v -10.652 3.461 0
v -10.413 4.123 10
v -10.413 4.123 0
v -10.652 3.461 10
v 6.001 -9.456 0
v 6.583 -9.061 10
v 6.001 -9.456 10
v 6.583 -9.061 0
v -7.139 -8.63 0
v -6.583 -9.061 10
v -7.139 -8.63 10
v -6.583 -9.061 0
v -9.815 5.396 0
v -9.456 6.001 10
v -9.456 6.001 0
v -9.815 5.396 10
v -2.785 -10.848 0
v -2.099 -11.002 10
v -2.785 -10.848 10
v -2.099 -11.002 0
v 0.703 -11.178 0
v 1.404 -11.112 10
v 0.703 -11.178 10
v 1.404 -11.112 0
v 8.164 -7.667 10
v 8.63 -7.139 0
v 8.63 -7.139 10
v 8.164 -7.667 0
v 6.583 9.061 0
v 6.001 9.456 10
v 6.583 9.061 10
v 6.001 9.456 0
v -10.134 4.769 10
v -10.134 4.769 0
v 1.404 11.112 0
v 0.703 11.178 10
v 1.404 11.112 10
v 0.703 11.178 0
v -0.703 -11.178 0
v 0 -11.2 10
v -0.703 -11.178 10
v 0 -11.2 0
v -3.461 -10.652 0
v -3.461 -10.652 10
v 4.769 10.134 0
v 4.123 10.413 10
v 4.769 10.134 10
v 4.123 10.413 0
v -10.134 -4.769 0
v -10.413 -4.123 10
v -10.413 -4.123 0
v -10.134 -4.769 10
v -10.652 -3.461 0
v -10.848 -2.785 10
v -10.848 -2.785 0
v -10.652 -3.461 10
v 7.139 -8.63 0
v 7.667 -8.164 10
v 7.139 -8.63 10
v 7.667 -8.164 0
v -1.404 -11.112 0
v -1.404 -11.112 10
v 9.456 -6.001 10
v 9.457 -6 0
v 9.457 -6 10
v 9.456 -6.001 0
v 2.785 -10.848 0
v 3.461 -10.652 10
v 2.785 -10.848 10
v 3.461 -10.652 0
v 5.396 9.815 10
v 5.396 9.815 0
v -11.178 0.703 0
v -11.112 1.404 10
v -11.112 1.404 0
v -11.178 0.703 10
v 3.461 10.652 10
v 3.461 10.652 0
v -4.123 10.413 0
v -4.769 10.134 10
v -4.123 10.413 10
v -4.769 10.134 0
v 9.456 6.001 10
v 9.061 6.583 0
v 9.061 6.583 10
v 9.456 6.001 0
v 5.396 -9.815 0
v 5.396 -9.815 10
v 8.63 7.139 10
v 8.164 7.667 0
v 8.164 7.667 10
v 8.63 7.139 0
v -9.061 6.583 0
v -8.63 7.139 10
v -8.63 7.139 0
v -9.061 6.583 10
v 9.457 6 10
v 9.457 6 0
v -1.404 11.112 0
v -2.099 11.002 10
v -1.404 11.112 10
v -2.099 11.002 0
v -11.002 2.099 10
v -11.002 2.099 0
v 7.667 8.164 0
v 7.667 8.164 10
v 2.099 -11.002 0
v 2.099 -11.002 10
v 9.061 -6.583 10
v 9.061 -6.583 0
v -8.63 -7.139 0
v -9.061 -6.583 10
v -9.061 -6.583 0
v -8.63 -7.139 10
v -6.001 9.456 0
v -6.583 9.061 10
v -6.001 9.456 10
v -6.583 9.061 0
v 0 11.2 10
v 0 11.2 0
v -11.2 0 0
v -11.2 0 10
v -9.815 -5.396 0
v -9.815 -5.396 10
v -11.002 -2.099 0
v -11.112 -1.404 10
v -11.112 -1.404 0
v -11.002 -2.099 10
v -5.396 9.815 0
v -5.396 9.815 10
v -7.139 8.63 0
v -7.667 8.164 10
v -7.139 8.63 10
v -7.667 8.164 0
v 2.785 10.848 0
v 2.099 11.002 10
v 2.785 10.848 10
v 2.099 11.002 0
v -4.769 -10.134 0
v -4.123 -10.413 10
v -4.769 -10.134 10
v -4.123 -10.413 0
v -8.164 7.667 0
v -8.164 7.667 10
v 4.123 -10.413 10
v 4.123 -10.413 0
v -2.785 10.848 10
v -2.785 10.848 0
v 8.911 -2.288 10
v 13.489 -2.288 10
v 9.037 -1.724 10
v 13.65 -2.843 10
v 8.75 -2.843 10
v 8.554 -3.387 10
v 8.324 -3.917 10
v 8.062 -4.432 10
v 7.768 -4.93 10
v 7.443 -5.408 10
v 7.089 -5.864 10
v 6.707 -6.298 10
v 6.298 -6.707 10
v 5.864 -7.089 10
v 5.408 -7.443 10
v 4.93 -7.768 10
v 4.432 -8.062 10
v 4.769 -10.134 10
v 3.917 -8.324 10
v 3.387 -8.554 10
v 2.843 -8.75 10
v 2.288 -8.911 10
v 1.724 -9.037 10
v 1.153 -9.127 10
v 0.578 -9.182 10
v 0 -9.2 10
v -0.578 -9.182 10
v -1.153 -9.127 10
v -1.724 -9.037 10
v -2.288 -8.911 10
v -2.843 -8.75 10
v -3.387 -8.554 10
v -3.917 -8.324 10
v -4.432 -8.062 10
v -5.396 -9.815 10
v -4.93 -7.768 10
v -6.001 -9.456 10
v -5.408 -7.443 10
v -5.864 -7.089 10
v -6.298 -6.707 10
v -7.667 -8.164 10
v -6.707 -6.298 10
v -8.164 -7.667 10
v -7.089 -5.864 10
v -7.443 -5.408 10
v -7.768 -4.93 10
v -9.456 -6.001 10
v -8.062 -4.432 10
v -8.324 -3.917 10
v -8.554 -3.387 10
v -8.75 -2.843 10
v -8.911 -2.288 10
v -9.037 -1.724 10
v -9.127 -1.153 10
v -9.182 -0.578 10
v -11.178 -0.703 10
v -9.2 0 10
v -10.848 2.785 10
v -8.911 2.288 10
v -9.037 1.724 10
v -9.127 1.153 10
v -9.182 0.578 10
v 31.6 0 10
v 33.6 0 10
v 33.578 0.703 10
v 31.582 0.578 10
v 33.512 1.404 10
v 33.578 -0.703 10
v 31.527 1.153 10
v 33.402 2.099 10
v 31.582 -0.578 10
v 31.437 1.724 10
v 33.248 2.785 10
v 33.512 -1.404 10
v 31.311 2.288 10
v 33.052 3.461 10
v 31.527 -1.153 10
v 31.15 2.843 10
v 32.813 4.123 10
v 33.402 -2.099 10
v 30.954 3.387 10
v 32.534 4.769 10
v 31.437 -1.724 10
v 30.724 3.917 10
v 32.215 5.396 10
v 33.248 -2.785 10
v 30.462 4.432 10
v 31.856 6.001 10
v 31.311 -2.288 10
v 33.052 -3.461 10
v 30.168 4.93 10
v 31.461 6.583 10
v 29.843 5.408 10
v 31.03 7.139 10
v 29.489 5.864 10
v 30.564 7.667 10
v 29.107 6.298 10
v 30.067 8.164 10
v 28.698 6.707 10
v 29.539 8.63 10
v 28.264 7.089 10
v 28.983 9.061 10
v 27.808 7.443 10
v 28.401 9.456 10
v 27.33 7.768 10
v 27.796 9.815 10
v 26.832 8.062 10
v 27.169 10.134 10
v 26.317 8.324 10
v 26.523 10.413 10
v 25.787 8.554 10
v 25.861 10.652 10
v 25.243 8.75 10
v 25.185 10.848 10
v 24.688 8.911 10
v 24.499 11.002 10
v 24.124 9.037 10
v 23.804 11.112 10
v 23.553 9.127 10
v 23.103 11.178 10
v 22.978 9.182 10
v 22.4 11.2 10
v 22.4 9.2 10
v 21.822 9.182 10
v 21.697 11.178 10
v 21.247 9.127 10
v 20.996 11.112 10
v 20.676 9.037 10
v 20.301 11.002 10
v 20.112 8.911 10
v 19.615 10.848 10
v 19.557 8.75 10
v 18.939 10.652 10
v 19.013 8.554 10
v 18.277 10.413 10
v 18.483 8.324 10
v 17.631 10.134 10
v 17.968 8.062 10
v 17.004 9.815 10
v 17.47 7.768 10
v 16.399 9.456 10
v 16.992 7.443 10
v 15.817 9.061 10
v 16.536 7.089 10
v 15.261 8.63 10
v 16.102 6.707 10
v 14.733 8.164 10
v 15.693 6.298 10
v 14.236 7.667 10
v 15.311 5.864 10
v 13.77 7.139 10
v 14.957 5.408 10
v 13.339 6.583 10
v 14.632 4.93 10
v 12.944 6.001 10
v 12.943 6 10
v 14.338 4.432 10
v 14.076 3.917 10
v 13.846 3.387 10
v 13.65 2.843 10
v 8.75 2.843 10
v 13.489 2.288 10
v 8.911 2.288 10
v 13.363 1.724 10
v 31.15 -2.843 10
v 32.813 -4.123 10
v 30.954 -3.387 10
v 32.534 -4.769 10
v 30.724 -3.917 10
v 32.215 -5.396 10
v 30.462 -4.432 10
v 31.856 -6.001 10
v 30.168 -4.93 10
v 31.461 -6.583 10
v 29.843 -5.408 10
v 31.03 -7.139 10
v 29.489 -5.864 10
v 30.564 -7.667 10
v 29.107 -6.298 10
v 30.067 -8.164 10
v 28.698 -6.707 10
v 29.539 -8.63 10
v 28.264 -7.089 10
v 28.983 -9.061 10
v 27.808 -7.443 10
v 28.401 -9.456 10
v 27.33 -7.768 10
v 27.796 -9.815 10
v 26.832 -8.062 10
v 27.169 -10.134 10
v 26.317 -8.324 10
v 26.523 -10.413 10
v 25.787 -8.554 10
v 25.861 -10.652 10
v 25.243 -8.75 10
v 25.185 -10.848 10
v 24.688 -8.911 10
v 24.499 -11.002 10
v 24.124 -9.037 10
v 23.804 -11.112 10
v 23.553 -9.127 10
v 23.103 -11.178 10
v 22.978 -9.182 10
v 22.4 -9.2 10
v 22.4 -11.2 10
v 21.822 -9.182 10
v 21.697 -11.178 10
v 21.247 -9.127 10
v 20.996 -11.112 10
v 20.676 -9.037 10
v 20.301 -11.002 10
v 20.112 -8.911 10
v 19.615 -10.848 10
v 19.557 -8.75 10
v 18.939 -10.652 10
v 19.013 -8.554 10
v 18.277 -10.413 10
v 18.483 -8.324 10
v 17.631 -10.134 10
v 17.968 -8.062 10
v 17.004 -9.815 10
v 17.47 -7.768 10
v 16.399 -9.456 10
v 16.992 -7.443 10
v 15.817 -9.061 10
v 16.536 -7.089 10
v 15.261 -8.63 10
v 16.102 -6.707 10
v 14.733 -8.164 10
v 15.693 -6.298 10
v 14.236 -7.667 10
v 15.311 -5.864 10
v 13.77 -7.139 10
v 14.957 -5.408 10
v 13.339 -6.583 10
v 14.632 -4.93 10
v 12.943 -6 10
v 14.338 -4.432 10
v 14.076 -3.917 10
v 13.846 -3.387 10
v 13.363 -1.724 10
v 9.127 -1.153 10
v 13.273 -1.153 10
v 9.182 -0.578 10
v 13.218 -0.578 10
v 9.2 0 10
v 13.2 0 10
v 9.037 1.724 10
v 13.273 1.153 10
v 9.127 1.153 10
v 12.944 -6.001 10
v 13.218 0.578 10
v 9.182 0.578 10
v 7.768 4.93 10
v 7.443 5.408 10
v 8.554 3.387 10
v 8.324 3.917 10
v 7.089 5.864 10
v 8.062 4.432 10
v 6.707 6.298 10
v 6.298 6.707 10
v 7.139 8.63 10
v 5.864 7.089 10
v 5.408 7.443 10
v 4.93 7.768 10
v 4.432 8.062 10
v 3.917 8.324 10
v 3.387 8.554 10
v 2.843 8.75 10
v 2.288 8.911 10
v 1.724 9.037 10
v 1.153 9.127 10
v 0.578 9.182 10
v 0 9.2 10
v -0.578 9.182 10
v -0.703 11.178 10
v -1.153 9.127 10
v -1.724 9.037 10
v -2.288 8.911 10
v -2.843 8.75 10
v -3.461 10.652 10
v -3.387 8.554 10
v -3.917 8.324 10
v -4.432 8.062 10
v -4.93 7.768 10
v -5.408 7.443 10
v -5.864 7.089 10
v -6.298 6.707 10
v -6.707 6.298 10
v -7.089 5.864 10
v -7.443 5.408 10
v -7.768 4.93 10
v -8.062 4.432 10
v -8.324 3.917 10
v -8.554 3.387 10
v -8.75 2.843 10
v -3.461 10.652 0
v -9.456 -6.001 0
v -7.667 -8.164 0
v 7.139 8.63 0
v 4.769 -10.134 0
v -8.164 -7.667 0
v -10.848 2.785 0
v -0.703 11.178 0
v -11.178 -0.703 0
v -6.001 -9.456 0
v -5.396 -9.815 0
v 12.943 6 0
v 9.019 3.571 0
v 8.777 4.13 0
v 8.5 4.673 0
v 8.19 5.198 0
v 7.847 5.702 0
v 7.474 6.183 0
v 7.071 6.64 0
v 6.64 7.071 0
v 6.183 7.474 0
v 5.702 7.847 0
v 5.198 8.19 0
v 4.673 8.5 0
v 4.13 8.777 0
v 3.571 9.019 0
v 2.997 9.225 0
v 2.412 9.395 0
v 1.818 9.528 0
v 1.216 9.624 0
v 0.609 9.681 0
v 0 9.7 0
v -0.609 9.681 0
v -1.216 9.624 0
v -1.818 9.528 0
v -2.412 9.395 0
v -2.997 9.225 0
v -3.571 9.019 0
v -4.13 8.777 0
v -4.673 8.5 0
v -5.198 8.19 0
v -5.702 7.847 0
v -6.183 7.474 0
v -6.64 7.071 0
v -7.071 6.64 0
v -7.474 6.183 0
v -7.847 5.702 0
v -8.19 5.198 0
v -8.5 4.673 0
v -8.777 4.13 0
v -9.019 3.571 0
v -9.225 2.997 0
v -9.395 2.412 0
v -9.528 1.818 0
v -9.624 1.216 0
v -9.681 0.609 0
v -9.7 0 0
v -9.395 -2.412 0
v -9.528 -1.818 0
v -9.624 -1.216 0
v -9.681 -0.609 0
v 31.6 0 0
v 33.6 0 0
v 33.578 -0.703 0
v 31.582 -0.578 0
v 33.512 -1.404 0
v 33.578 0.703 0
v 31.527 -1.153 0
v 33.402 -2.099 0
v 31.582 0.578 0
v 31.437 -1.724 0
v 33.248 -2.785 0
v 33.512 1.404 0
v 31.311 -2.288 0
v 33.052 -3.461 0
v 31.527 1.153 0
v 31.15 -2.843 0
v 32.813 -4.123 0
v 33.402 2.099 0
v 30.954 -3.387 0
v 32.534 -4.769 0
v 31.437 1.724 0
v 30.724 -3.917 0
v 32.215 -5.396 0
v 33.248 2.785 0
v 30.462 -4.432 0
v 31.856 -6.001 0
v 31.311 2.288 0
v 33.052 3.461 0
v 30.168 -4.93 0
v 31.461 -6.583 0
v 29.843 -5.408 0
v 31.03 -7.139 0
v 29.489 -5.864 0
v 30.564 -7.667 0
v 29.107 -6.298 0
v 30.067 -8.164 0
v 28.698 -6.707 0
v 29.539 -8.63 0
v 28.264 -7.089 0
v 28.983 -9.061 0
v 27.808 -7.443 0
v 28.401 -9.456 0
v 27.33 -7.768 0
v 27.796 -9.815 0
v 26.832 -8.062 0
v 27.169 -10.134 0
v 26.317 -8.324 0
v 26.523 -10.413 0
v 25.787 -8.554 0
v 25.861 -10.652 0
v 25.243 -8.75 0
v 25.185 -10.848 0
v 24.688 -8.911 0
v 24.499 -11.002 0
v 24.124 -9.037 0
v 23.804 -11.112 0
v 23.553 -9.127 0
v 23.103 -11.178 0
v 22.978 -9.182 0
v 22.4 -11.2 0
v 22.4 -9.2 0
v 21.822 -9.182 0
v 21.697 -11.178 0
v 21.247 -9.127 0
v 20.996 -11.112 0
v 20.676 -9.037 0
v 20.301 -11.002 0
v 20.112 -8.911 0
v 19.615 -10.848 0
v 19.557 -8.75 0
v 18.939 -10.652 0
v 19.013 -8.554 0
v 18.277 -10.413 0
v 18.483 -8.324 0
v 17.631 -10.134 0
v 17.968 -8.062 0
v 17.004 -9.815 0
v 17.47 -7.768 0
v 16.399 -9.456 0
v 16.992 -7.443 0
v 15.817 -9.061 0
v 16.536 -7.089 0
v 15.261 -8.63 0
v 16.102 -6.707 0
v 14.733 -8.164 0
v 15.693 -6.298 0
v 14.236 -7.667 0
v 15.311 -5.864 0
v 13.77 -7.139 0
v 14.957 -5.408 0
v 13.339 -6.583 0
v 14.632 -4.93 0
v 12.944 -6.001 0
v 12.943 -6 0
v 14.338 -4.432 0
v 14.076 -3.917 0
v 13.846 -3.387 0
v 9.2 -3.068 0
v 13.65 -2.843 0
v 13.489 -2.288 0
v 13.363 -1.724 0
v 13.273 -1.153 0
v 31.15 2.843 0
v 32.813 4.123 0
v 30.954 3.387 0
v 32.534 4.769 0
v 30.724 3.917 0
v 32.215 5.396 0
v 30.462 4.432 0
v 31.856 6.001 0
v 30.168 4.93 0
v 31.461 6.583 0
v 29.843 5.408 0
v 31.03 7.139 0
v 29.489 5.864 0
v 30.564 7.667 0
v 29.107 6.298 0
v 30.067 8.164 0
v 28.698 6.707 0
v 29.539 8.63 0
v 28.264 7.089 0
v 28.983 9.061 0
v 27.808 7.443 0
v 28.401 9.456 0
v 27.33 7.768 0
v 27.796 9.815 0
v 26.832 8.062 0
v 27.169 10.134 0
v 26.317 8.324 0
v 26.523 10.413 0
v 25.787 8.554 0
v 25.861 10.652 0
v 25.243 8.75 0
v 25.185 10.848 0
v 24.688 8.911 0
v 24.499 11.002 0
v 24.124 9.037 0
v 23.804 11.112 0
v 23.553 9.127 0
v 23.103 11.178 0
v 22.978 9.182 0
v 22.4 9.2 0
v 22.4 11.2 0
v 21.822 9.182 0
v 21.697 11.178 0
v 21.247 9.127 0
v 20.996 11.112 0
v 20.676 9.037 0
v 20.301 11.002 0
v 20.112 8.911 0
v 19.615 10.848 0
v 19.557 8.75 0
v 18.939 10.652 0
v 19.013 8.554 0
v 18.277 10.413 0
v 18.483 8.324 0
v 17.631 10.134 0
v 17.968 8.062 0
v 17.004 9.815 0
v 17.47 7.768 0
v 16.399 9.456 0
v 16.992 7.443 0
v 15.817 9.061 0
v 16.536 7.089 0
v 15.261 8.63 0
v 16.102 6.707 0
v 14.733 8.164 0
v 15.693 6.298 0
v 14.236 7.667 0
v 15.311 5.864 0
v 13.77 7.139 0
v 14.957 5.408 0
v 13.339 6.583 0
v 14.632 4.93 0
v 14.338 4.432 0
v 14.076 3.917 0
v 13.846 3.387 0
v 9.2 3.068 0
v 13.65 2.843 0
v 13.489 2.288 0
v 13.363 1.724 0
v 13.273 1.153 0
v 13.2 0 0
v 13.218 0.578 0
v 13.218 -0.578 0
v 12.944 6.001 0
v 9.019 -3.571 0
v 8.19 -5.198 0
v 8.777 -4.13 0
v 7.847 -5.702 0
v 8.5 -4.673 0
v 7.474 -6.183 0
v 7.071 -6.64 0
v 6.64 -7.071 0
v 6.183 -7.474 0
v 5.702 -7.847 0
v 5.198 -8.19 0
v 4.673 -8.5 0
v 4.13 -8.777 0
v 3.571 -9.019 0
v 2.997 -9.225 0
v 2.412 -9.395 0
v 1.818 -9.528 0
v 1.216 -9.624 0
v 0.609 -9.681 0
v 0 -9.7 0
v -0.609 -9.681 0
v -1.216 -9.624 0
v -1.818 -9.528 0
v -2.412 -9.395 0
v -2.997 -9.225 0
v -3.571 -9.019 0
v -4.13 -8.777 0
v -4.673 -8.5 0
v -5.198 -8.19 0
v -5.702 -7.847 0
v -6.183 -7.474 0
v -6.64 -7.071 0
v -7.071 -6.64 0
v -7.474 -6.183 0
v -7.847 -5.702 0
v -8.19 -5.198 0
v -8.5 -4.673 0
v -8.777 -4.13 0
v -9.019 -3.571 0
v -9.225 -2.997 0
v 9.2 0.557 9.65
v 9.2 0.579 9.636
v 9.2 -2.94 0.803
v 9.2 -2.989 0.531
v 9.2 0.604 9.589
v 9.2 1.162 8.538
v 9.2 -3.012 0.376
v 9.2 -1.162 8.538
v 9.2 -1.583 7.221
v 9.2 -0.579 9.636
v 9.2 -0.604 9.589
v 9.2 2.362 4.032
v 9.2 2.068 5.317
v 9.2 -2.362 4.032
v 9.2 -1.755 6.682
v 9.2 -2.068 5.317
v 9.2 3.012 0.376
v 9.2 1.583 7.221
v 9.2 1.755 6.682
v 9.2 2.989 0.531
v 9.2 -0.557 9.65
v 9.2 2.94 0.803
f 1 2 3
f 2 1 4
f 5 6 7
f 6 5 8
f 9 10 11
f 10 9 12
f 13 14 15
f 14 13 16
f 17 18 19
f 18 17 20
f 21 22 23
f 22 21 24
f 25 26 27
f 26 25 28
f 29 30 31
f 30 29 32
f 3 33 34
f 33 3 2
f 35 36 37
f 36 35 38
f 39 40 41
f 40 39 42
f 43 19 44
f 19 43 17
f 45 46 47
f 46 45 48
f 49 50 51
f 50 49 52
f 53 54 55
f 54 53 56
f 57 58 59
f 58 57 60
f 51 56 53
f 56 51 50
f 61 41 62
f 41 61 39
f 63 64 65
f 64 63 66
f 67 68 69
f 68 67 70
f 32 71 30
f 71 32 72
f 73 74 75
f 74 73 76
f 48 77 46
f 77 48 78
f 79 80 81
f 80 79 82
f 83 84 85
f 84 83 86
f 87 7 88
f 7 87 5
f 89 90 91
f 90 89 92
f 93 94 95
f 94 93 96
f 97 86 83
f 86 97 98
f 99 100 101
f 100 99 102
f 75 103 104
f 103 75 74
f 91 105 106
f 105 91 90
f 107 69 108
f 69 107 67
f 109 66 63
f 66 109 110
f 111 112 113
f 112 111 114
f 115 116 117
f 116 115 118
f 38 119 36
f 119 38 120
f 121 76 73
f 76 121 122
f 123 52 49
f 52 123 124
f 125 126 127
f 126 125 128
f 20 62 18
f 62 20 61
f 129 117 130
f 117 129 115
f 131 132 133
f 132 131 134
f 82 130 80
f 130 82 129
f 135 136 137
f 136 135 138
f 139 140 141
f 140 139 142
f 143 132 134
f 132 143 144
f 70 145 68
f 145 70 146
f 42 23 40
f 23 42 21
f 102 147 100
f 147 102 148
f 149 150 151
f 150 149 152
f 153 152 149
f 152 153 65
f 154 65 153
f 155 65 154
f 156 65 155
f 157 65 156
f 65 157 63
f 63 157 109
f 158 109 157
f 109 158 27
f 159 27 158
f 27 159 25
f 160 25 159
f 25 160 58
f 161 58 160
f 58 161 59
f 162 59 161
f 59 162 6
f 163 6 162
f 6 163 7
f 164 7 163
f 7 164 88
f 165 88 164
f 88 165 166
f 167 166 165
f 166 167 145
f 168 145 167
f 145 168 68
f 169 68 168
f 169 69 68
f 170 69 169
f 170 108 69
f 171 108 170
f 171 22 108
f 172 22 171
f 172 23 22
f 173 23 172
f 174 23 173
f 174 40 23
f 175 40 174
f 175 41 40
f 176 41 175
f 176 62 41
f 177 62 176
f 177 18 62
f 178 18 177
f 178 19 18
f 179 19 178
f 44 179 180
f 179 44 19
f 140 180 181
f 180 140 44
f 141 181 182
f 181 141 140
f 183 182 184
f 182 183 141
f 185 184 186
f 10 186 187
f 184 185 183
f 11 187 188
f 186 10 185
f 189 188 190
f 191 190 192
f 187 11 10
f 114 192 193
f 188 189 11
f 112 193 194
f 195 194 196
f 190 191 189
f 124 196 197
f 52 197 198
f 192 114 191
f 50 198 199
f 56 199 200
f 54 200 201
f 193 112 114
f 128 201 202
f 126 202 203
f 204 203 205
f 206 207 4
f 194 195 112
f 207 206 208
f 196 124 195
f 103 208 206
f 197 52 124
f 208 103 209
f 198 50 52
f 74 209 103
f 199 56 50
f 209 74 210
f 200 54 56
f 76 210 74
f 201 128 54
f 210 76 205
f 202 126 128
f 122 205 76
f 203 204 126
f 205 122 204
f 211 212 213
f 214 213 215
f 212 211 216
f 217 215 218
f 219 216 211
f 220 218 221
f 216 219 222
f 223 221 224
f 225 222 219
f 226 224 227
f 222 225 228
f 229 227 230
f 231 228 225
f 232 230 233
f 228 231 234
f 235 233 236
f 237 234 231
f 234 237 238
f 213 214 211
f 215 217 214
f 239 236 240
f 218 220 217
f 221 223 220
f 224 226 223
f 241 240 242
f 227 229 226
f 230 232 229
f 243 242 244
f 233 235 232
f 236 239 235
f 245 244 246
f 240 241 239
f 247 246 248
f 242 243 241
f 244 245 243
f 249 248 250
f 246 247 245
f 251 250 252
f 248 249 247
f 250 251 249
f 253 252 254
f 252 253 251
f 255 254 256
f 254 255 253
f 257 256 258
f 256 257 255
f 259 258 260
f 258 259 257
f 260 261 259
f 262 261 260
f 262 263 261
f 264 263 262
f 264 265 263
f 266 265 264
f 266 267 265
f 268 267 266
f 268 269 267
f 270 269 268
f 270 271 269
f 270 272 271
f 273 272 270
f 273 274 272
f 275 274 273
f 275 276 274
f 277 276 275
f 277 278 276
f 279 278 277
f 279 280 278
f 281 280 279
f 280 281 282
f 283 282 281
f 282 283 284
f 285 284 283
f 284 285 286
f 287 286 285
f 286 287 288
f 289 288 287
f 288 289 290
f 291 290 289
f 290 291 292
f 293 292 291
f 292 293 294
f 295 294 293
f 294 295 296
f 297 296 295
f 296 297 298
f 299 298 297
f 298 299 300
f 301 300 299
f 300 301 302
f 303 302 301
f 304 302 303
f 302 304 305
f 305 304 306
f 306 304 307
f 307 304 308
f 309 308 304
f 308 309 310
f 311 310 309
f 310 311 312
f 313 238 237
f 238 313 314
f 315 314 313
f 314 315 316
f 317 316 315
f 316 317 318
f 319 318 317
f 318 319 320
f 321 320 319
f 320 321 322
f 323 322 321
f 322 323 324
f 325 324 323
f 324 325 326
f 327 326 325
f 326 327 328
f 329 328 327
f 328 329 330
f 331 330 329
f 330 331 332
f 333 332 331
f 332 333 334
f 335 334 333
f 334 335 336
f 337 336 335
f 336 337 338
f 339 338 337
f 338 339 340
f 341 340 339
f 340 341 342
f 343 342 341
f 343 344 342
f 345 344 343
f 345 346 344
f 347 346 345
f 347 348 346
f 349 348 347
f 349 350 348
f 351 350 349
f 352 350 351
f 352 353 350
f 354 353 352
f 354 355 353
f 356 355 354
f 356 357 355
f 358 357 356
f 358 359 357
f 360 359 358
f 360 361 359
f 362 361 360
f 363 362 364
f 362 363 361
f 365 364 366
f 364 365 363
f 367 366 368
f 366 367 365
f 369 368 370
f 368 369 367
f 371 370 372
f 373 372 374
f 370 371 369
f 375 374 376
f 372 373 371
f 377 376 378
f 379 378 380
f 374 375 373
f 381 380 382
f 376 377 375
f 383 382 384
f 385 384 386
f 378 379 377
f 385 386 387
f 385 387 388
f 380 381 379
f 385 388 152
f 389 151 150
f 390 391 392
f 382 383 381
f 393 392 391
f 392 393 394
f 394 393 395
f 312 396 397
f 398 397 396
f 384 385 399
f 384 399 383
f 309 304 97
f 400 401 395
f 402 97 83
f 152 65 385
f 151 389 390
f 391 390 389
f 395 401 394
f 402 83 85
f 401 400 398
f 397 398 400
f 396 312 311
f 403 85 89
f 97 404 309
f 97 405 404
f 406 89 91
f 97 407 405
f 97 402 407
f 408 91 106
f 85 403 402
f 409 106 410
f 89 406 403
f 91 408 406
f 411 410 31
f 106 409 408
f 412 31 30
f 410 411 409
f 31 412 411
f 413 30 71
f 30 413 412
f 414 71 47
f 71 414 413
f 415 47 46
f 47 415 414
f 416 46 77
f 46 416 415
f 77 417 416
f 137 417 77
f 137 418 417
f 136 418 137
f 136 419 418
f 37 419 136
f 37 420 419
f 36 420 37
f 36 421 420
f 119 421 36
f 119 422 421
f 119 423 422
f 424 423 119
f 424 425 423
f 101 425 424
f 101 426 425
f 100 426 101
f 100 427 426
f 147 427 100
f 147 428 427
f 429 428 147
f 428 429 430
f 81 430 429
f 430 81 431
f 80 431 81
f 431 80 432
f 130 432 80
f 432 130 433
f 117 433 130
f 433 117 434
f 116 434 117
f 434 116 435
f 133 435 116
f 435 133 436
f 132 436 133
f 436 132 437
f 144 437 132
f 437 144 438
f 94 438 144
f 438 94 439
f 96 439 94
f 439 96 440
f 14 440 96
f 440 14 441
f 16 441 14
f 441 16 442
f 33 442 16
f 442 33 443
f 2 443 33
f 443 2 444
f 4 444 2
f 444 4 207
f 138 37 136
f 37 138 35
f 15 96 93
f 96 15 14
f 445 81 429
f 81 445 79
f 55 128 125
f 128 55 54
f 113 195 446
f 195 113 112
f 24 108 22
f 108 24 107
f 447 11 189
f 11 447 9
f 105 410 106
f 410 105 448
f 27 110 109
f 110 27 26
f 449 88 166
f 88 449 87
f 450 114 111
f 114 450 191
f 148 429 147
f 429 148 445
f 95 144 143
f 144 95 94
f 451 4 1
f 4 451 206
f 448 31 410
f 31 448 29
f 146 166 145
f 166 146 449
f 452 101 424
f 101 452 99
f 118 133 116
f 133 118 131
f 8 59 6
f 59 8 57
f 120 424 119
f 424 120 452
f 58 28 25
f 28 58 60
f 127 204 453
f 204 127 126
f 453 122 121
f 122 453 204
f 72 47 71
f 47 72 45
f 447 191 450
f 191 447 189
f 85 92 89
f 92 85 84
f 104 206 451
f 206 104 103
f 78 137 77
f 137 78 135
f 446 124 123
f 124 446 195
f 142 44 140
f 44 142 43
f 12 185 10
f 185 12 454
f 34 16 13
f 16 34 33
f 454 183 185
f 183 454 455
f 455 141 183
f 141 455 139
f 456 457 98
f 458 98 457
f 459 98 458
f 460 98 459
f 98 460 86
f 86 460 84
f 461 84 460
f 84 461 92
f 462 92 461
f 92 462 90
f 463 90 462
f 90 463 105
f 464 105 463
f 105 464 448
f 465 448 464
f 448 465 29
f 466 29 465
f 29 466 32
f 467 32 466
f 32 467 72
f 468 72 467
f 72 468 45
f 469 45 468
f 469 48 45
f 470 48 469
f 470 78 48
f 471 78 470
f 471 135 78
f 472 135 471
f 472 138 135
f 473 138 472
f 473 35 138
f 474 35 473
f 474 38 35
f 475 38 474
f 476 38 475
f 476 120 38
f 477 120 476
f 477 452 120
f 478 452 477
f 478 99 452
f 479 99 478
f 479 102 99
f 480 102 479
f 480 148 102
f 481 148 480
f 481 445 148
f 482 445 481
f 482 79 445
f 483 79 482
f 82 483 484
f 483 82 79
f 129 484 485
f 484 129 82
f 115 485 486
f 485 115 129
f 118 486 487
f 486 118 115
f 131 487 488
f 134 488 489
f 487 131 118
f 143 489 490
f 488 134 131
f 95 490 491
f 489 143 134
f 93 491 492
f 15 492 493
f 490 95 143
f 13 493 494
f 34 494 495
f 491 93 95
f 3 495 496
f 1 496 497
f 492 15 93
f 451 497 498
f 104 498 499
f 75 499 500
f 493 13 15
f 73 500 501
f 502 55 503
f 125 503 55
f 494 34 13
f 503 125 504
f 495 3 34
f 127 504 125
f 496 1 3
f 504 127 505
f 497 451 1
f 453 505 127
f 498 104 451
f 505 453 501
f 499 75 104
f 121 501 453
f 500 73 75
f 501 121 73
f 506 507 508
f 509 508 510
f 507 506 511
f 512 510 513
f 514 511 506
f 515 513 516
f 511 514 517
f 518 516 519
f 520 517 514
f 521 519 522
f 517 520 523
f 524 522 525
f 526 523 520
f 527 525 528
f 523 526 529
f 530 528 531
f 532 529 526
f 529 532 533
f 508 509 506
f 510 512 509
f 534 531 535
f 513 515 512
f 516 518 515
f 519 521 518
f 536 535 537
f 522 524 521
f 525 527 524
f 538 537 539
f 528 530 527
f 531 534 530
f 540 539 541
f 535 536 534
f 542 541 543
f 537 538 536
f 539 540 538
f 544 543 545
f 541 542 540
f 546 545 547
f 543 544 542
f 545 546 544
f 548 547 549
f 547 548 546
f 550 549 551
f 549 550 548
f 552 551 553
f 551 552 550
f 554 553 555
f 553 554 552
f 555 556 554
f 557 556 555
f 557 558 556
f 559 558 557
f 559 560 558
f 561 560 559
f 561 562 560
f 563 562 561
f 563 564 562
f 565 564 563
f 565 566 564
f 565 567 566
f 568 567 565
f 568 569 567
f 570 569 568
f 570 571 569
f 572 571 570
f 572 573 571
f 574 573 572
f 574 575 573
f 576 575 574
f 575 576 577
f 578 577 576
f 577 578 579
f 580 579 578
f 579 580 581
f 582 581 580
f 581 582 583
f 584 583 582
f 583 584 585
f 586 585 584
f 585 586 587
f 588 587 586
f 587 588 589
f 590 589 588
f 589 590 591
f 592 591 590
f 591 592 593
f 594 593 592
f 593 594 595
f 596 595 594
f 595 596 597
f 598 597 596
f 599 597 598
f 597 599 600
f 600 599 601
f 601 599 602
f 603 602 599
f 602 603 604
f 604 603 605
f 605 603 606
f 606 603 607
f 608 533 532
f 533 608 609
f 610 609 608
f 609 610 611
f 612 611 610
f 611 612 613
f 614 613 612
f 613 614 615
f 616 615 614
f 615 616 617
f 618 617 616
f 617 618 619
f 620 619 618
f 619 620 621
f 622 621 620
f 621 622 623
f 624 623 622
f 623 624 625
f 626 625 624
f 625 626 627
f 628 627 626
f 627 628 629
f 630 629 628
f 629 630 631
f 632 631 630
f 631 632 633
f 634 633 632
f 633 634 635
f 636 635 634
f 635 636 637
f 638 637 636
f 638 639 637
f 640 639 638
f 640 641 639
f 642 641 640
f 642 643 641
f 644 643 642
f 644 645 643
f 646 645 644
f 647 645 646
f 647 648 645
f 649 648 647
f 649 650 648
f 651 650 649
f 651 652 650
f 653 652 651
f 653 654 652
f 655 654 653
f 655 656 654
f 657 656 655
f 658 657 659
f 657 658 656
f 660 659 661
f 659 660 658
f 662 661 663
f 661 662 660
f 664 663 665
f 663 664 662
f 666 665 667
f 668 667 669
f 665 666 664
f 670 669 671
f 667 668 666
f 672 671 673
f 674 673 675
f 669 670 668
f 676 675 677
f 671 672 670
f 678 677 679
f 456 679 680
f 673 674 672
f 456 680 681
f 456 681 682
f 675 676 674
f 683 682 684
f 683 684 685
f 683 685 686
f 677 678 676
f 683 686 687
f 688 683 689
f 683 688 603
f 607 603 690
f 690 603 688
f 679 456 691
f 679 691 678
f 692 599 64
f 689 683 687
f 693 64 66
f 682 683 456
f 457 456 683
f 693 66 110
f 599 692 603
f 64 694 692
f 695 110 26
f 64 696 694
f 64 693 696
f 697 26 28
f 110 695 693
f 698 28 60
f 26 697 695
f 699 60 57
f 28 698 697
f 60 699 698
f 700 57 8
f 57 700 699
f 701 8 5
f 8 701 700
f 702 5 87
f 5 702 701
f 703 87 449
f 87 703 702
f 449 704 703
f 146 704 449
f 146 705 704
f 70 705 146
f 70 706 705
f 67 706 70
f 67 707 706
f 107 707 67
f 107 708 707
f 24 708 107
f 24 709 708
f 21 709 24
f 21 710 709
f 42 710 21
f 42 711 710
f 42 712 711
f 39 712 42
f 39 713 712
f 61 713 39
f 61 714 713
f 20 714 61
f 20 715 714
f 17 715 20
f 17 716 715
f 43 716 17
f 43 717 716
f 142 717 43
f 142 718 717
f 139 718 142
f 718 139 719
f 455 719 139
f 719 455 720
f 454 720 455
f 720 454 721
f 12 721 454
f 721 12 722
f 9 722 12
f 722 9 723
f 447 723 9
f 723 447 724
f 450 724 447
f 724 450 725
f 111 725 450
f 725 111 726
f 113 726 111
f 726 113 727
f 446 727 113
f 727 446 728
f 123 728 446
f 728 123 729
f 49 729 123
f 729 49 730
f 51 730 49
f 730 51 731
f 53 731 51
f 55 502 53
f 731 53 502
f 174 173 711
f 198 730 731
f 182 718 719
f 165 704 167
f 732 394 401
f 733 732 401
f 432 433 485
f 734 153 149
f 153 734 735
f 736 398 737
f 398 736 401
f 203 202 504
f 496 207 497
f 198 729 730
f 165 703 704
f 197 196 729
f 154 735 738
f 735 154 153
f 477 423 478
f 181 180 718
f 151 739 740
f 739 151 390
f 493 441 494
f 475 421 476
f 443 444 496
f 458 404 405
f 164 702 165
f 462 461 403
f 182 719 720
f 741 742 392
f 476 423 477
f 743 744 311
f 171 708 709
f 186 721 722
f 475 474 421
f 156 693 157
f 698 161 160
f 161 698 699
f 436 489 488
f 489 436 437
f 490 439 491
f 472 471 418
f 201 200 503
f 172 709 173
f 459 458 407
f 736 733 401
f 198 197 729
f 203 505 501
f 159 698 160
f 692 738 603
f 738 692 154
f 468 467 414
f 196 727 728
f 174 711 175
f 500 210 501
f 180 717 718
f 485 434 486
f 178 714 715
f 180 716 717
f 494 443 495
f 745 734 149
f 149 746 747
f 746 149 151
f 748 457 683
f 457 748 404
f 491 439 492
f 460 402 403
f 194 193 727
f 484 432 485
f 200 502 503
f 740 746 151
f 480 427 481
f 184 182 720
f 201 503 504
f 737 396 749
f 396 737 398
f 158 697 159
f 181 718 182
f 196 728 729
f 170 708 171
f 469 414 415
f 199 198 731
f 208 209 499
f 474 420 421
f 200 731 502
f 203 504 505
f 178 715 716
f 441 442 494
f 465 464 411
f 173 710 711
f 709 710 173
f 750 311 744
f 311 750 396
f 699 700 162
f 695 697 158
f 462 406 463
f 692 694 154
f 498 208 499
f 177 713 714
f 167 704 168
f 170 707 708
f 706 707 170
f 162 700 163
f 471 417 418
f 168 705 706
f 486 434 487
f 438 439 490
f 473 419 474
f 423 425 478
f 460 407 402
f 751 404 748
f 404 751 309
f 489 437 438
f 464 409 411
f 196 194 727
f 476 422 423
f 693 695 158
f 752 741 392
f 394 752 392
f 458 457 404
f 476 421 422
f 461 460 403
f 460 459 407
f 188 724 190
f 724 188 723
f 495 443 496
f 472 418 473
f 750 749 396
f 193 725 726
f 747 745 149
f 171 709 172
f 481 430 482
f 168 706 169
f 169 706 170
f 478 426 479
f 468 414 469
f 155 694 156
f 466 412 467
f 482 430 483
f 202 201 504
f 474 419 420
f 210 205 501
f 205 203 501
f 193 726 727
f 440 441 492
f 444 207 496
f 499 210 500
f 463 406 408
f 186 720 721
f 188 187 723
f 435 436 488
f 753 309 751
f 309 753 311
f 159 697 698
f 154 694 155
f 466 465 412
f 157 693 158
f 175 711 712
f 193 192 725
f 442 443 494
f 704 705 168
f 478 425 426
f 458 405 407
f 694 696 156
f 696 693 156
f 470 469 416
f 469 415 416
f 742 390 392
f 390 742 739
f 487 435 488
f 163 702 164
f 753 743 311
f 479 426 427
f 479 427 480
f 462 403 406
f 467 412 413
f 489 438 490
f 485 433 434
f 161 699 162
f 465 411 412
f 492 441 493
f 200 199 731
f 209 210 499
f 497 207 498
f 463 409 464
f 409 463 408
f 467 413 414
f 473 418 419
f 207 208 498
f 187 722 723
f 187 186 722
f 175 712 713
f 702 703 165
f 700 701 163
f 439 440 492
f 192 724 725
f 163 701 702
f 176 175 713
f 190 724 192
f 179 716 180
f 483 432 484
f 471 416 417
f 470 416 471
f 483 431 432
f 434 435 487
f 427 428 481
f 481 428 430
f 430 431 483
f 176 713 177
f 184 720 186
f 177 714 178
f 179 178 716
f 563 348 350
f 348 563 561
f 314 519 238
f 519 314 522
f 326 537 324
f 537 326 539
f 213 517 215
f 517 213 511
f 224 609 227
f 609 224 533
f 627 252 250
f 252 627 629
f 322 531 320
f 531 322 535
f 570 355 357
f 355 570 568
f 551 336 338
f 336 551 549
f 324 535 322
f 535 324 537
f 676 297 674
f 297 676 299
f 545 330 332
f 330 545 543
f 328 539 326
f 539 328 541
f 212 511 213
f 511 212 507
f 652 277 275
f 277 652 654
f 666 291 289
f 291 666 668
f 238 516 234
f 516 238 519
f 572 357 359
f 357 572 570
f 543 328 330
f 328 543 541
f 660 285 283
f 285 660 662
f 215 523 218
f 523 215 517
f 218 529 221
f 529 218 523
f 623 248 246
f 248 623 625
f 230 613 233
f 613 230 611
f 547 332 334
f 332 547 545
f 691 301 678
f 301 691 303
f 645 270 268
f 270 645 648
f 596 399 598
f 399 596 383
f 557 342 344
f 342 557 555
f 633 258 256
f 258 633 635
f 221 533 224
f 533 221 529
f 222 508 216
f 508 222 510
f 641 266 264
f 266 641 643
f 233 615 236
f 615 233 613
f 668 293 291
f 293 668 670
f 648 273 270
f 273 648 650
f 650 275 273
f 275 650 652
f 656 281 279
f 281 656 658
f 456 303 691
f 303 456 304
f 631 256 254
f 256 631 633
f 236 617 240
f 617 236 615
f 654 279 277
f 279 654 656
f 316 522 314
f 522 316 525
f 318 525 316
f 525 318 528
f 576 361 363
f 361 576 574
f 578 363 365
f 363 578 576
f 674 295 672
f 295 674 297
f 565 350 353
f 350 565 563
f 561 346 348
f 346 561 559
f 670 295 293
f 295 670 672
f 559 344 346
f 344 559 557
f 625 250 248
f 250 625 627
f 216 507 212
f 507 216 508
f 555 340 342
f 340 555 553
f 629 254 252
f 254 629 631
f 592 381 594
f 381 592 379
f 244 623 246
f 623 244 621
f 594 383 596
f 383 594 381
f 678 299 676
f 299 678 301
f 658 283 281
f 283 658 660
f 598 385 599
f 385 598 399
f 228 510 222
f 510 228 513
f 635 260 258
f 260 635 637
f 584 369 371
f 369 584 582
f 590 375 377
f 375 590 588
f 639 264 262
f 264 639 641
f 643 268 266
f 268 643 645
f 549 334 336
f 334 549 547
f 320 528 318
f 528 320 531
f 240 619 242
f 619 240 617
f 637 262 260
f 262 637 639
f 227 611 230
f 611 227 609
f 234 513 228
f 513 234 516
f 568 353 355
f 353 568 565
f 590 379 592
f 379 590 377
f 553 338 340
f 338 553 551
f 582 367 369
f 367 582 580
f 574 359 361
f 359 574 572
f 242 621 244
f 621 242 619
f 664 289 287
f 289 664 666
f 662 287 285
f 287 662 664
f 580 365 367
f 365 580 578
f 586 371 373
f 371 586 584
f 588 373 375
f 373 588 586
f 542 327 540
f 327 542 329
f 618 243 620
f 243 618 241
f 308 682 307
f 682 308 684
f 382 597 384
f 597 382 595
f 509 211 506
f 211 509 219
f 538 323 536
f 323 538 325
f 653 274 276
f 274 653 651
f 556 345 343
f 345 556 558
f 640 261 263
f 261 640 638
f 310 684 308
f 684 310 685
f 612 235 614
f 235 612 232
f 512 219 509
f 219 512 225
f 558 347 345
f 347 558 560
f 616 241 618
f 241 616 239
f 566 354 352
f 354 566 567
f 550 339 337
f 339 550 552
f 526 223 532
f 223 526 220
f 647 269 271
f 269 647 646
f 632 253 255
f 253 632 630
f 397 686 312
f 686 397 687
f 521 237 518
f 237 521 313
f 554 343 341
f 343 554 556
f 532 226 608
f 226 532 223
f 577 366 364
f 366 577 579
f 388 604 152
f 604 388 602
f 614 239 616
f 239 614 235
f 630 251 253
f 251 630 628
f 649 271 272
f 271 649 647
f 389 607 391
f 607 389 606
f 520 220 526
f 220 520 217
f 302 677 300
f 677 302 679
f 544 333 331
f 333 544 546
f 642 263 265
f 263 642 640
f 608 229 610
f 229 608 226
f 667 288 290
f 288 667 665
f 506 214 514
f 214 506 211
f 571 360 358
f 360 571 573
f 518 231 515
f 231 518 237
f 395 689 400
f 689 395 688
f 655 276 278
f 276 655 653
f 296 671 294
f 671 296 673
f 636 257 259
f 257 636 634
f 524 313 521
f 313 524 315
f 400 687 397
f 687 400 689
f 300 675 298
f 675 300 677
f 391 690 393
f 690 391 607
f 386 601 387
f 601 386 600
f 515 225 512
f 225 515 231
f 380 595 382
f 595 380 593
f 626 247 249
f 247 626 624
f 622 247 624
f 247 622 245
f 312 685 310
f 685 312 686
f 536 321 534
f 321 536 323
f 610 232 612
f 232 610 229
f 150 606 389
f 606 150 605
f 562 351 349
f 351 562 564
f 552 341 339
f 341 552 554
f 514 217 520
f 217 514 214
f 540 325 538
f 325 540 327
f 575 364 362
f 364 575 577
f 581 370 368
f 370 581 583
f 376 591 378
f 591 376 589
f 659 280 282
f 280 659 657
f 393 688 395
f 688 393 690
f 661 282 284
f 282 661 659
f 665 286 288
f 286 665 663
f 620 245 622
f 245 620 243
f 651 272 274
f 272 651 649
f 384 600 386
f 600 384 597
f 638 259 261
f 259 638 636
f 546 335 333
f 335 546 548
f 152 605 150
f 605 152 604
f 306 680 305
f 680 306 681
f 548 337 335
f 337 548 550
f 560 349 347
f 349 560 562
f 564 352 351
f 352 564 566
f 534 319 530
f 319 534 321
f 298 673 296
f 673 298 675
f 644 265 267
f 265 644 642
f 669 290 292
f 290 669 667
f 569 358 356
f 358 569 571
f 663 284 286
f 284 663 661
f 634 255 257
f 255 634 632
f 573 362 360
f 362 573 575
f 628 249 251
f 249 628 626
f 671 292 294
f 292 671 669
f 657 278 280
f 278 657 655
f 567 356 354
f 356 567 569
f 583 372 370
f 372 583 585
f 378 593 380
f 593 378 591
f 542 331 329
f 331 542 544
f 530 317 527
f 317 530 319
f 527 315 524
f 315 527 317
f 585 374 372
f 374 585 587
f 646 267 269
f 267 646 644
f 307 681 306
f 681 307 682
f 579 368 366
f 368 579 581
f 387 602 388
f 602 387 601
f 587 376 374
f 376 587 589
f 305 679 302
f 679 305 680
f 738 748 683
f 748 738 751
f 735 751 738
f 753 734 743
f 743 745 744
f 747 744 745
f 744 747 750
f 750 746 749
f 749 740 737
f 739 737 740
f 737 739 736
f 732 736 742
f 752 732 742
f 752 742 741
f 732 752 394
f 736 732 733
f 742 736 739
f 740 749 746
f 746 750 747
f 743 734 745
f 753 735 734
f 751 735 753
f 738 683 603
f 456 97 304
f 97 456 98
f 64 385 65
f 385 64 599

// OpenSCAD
$fa = 1;
$fs = .4;
$fn = 100;


Di = 18.4;
Do = 18.4 + 4;
Ln = 10;


difference(){
    cylinder(Ln, Do / 2, Do / 2);
    cylinder(Ln, Di / 2 + .5, Di / 2);
}

translate([Do, 0, 0])
    difference(){
        cylinder(Ln, Do / 2, Do / 2);
        cylinder(Ln, Di / 2, Di / 2);
    }

translate([Do / 2 - 2, -6, 0])
cube([4, 12, 10]);
    
